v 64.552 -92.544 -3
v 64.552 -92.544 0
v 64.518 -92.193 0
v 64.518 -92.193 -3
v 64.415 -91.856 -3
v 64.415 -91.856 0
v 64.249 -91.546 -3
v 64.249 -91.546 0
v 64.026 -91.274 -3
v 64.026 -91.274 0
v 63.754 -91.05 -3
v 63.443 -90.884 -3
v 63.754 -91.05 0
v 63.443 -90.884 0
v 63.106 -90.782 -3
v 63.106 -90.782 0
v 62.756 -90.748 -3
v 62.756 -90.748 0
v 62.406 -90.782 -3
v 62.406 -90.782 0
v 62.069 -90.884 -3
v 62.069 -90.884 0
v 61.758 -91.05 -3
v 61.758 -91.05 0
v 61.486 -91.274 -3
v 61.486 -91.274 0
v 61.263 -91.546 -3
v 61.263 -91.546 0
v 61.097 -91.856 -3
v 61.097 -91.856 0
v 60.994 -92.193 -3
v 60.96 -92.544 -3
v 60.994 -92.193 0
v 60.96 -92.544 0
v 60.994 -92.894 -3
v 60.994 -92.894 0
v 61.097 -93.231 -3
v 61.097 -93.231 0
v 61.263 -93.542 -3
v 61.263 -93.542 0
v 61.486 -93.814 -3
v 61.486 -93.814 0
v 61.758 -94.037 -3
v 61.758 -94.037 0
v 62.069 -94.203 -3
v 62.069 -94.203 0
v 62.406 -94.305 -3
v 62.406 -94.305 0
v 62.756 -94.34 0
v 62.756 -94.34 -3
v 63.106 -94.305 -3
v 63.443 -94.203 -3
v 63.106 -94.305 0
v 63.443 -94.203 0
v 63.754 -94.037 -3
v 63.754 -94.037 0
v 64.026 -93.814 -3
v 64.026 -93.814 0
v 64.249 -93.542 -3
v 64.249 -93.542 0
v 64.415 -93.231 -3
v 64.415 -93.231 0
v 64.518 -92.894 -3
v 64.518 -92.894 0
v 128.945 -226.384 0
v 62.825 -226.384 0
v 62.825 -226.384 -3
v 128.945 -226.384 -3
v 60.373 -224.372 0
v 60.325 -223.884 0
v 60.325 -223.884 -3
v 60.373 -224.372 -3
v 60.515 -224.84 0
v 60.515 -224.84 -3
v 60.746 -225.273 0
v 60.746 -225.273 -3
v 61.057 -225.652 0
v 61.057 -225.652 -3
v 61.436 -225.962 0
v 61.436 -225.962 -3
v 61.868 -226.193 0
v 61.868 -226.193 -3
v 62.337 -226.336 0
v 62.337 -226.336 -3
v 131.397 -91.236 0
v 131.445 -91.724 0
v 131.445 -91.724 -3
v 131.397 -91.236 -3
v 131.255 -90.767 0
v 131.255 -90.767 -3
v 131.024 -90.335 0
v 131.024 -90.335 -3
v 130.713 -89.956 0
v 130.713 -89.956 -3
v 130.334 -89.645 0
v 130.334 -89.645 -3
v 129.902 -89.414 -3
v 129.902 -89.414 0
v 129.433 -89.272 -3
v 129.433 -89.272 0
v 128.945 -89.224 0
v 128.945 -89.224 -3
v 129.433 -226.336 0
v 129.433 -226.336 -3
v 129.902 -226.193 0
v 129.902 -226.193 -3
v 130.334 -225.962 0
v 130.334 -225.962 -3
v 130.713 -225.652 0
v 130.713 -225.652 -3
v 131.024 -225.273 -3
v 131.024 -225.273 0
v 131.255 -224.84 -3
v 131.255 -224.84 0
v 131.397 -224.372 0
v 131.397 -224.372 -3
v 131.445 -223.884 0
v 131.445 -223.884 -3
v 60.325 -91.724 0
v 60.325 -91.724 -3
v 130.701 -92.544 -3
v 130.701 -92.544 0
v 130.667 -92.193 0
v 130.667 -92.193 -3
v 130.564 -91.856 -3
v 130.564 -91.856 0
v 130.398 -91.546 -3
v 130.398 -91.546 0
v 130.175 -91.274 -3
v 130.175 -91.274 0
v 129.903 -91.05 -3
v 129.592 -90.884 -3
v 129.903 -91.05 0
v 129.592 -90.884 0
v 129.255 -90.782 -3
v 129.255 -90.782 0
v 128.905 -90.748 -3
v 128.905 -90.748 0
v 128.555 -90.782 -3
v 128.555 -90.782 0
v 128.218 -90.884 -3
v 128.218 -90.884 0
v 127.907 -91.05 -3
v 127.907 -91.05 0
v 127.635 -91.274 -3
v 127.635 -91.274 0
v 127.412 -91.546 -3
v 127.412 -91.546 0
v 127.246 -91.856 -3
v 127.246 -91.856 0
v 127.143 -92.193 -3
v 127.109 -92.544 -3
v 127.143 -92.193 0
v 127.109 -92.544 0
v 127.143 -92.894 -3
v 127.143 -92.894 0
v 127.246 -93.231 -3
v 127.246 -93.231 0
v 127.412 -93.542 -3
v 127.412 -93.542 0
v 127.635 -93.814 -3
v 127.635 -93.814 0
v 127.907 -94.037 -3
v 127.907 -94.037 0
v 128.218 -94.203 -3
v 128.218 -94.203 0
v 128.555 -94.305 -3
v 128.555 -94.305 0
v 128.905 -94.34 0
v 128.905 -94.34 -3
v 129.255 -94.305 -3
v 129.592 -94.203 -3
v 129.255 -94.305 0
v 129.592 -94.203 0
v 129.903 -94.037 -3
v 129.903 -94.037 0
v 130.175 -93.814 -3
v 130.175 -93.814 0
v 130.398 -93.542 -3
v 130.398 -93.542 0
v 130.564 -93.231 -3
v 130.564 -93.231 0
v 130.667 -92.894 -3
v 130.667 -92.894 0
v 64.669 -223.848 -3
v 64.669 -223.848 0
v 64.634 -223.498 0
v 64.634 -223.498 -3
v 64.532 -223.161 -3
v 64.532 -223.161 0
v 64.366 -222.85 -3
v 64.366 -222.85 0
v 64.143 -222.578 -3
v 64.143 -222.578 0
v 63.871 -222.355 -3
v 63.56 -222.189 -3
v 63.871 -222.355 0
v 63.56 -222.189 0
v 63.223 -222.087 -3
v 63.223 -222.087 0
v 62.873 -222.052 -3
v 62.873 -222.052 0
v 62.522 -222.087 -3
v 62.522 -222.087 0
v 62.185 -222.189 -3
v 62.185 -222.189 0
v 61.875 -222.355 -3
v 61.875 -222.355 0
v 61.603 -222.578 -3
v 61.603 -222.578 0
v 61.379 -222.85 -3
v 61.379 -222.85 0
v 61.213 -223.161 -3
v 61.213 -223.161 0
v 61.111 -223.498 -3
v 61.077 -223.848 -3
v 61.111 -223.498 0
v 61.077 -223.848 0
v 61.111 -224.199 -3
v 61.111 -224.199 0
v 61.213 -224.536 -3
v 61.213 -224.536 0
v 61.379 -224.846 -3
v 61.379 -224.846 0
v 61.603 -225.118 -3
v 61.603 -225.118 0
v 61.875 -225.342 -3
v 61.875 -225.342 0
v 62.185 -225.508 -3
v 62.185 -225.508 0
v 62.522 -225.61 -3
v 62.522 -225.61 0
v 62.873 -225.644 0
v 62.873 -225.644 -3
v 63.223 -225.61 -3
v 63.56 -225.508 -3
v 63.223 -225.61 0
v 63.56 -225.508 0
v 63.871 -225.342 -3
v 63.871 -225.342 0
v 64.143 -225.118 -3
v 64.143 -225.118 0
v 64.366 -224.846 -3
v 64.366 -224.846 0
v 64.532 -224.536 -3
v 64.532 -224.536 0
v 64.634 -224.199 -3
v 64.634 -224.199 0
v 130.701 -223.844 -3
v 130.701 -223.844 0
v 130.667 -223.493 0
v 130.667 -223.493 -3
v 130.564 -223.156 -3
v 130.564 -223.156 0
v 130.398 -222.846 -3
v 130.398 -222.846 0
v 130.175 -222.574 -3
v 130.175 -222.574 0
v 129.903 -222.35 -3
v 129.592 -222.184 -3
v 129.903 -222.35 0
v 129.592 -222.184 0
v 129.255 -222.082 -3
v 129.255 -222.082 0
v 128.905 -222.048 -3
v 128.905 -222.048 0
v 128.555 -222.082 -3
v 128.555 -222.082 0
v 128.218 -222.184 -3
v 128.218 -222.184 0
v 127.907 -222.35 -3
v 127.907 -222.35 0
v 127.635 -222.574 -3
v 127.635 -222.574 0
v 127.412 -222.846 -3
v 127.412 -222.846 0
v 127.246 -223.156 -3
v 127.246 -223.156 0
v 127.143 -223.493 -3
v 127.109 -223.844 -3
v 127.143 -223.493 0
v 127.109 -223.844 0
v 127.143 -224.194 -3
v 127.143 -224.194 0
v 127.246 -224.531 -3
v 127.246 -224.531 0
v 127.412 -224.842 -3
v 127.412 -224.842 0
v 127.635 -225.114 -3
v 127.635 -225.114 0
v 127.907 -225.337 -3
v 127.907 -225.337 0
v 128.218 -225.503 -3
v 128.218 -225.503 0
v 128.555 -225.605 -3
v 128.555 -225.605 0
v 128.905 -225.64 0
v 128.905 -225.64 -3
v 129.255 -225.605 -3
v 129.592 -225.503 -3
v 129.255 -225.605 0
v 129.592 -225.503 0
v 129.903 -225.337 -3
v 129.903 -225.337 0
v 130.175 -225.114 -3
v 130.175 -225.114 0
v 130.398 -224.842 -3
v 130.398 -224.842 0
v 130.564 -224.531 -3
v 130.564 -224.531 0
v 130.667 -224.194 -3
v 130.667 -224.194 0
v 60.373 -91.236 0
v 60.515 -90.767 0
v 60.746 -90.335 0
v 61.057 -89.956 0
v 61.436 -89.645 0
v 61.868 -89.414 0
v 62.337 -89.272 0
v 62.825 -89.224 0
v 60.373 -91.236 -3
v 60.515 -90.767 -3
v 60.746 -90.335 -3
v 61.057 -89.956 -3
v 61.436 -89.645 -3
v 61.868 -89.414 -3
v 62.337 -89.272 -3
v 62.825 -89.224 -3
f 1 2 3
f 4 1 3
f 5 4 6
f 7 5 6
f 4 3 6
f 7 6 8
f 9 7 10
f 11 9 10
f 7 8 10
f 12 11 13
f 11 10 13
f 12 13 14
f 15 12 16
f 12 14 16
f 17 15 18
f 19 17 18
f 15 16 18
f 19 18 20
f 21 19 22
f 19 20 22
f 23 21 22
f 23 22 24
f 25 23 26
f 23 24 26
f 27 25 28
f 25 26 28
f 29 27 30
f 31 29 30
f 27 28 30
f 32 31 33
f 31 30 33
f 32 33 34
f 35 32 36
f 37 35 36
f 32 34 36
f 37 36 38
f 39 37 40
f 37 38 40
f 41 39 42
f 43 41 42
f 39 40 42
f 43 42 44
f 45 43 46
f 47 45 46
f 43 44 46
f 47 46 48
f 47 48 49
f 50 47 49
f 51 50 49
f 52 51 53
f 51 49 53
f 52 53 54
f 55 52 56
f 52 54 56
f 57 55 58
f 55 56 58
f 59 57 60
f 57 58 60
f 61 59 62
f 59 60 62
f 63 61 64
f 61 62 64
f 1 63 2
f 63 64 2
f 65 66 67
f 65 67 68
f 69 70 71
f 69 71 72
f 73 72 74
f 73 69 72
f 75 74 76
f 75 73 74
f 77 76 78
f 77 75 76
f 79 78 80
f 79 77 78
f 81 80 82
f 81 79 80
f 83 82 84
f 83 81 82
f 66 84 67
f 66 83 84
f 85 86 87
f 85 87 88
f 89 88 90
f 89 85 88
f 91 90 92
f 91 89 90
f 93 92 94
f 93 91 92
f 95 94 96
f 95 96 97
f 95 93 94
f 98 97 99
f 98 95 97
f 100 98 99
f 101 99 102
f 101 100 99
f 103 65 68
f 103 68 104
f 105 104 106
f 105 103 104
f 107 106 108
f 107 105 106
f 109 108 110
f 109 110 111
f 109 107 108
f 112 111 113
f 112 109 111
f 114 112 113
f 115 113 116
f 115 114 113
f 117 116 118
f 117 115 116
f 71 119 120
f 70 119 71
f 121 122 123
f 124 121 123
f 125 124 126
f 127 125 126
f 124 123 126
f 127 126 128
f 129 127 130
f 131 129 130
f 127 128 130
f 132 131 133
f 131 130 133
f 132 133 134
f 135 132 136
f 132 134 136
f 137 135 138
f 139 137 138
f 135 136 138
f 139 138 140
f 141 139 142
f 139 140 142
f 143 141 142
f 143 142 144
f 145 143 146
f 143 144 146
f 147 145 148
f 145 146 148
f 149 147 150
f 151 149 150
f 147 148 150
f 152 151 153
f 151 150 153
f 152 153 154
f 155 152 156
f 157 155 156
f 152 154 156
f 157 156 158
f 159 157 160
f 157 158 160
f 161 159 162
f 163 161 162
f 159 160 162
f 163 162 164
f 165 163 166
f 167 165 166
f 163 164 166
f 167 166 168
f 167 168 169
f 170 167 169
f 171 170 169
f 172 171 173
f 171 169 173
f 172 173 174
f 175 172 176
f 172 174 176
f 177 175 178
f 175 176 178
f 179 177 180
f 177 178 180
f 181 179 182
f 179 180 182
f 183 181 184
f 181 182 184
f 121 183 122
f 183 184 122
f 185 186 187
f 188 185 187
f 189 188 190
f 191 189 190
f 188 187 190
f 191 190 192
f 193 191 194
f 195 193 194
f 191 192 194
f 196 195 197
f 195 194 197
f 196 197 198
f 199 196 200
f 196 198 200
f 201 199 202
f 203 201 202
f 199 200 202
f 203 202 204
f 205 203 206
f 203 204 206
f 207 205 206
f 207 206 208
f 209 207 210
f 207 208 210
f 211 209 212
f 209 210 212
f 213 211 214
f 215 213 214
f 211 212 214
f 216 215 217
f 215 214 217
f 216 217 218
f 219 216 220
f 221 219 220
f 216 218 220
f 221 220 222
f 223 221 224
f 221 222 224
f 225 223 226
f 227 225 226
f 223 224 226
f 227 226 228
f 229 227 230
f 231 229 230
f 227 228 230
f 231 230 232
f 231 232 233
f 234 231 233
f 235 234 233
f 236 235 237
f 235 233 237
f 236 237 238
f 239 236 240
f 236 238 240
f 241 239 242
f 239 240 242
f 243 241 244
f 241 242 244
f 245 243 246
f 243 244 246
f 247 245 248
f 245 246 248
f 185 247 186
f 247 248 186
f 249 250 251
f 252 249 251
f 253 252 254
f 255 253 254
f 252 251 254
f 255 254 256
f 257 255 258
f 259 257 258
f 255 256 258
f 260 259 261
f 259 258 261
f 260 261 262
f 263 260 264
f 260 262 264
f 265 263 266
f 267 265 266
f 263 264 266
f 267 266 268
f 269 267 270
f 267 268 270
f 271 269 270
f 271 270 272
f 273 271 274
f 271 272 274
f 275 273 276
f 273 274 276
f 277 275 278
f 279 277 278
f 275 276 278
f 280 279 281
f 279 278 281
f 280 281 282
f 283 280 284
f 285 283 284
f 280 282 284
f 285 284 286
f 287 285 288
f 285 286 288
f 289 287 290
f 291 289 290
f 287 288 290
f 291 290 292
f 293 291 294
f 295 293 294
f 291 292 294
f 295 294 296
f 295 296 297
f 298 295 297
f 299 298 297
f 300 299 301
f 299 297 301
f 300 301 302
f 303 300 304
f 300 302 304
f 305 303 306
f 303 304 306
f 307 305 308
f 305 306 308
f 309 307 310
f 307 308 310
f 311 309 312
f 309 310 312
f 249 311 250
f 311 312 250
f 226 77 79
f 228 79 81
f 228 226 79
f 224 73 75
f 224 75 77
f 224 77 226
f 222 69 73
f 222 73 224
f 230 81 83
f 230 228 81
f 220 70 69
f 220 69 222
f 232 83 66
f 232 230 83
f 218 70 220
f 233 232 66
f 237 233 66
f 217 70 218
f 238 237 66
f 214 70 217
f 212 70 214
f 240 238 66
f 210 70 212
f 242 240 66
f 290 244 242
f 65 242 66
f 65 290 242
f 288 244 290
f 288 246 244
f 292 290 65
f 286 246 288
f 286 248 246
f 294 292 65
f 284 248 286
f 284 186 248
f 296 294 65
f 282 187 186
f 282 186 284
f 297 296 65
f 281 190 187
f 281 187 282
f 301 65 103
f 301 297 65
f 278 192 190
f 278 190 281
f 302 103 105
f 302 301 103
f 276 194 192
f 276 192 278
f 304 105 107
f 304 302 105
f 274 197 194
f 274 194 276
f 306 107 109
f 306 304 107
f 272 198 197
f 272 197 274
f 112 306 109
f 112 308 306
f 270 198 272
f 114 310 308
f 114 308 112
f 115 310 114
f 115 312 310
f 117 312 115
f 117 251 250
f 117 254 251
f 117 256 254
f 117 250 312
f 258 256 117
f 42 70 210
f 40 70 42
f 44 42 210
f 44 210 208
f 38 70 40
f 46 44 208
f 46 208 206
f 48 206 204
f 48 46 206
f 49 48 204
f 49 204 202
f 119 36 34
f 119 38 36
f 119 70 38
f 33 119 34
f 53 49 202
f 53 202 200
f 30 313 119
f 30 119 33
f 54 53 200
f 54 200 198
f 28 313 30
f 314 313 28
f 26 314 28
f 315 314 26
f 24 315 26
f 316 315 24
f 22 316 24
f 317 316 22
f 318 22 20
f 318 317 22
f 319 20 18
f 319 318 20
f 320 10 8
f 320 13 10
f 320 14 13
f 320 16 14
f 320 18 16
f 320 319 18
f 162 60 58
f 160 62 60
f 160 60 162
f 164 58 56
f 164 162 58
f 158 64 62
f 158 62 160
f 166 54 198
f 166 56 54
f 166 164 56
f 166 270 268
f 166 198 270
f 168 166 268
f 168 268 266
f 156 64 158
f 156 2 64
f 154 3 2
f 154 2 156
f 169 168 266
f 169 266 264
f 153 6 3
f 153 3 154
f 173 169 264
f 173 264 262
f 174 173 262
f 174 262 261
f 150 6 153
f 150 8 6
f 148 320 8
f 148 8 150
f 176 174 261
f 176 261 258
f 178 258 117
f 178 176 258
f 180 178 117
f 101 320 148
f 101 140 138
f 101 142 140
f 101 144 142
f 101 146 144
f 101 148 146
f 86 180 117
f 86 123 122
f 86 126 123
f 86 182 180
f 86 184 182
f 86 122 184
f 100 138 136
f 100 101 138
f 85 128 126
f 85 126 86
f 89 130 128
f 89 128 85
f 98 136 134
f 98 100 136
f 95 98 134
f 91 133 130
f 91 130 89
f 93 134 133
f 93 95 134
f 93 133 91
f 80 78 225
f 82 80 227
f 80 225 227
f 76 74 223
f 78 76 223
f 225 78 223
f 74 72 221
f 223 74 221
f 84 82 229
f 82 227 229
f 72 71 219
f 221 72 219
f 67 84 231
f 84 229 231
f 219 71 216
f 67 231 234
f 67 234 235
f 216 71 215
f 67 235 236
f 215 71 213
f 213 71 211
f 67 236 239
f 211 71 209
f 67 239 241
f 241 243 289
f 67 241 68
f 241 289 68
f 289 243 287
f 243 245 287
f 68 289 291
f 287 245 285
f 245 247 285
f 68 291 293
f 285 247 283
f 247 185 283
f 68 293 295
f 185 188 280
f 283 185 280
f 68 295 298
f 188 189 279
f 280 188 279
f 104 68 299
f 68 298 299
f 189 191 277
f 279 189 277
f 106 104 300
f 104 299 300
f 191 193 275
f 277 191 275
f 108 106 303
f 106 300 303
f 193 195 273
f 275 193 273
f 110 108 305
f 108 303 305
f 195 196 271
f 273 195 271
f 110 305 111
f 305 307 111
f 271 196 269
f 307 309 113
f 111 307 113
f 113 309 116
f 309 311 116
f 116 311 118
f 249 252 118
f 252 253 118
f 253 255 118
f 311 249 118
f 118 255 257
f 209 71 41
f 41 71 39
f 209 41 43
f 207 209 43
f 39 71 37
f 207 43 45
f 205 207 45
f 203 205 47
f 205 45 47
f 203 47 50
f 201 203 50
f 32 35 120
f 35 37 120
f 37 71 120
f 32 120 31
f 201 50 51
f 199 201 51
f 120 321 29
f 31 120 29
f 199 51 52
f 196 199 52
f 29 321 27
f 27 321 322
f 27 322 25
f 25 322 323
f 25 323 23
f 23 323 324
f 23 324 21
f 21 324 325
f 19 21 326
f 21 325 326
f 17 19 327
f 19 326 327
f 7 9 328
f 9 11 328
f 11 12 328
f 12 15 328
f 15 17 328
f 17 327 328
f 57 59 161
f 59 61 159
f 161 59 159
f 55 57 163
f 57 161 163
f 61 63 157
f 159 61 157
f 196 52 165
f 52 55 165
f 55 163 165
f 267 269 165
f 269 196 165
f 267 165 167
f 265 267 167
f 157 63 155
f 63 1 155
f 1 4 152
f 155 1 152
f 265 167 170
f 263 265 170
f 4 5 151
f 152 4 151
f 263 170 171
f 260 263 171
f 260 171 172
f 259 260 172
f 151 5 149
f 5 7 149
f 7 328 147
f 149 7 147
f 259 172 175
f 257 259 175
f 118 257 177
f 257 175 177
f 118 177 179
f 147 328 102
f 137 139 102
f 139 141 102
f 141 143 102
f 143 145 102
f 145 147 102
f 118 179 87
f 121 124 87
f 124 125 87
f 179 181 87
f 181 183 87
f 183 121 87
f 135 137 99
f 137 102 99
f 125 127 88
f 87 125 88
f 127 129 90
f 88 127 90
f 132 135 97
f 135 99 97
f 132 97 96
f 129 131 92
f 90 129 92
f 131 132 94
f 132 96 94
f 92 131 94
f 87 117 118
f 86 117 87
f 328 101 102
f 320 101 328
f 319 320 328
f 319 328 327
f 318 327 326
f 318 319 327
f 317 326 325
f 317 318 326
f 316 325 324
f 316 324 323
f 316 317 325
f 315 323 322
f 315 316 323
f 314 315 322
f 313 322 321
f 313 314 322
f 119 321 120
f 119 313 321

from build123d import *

# Parameters (mm, degrees)
ESQUISSE2_R        = 1.796051863
ESQUISSE2_R_2      = 1.796074603
BOSS_EXTRU_1_DEPTH = 3


with BuildPart() as part:
    # Esquisse2 → Boss.-Extru.1 (new body)
    with BuildSketch(Plane.XY):
        with BuildLine():
            Line((62.825, -226.383779), (128.945, -226.383779))
            ThreePointArc((128.945, -226.383779), (130.712766953, -225.651545953), (131.445, -223.883779))
            Line((131.445, -223.883779), (131.445, -91.723779))
            ThreePointArc((131.445, -91.723779), (130.712766953, -89.956012047), (128.945, -89.223779))
            Line((128.945, -89.223779), (62.825, -89.223779))
            ThreePointArc((62.825, -89.223779), (61.057233047, -89.956012047), (60.325, -91.723779))
            Line((60.325, -91.723779), (60.325, -223.883779))
            ThreePointArc((60.325, -223.883779), (61.057233047, -225.651545953), (62.825, -226.383779))
        make_face()
        with Locations((128.905, -223.8437785)):
            Circle(ESQUISSE2_R, mode=Mode.SUBTRACT)
        with Locations((62.872827217, -223.848297546)):
            Circle(ESQUISSE2_R_2, mode=Mode.SUBTRACT)
        with Locations((62.756034, -92.5438125)):
            Circle(ESQUISSE2_R, mode=Mode.SUBTRACT)
        with Locations((128.905000137, -92.543812421)):
            Circle(ESQUISSE2_R, mode=Mode.SUBTRACT)
    extrude(amount=-BOSS_EXTRU_1_DEPTH)


solid = part.part
